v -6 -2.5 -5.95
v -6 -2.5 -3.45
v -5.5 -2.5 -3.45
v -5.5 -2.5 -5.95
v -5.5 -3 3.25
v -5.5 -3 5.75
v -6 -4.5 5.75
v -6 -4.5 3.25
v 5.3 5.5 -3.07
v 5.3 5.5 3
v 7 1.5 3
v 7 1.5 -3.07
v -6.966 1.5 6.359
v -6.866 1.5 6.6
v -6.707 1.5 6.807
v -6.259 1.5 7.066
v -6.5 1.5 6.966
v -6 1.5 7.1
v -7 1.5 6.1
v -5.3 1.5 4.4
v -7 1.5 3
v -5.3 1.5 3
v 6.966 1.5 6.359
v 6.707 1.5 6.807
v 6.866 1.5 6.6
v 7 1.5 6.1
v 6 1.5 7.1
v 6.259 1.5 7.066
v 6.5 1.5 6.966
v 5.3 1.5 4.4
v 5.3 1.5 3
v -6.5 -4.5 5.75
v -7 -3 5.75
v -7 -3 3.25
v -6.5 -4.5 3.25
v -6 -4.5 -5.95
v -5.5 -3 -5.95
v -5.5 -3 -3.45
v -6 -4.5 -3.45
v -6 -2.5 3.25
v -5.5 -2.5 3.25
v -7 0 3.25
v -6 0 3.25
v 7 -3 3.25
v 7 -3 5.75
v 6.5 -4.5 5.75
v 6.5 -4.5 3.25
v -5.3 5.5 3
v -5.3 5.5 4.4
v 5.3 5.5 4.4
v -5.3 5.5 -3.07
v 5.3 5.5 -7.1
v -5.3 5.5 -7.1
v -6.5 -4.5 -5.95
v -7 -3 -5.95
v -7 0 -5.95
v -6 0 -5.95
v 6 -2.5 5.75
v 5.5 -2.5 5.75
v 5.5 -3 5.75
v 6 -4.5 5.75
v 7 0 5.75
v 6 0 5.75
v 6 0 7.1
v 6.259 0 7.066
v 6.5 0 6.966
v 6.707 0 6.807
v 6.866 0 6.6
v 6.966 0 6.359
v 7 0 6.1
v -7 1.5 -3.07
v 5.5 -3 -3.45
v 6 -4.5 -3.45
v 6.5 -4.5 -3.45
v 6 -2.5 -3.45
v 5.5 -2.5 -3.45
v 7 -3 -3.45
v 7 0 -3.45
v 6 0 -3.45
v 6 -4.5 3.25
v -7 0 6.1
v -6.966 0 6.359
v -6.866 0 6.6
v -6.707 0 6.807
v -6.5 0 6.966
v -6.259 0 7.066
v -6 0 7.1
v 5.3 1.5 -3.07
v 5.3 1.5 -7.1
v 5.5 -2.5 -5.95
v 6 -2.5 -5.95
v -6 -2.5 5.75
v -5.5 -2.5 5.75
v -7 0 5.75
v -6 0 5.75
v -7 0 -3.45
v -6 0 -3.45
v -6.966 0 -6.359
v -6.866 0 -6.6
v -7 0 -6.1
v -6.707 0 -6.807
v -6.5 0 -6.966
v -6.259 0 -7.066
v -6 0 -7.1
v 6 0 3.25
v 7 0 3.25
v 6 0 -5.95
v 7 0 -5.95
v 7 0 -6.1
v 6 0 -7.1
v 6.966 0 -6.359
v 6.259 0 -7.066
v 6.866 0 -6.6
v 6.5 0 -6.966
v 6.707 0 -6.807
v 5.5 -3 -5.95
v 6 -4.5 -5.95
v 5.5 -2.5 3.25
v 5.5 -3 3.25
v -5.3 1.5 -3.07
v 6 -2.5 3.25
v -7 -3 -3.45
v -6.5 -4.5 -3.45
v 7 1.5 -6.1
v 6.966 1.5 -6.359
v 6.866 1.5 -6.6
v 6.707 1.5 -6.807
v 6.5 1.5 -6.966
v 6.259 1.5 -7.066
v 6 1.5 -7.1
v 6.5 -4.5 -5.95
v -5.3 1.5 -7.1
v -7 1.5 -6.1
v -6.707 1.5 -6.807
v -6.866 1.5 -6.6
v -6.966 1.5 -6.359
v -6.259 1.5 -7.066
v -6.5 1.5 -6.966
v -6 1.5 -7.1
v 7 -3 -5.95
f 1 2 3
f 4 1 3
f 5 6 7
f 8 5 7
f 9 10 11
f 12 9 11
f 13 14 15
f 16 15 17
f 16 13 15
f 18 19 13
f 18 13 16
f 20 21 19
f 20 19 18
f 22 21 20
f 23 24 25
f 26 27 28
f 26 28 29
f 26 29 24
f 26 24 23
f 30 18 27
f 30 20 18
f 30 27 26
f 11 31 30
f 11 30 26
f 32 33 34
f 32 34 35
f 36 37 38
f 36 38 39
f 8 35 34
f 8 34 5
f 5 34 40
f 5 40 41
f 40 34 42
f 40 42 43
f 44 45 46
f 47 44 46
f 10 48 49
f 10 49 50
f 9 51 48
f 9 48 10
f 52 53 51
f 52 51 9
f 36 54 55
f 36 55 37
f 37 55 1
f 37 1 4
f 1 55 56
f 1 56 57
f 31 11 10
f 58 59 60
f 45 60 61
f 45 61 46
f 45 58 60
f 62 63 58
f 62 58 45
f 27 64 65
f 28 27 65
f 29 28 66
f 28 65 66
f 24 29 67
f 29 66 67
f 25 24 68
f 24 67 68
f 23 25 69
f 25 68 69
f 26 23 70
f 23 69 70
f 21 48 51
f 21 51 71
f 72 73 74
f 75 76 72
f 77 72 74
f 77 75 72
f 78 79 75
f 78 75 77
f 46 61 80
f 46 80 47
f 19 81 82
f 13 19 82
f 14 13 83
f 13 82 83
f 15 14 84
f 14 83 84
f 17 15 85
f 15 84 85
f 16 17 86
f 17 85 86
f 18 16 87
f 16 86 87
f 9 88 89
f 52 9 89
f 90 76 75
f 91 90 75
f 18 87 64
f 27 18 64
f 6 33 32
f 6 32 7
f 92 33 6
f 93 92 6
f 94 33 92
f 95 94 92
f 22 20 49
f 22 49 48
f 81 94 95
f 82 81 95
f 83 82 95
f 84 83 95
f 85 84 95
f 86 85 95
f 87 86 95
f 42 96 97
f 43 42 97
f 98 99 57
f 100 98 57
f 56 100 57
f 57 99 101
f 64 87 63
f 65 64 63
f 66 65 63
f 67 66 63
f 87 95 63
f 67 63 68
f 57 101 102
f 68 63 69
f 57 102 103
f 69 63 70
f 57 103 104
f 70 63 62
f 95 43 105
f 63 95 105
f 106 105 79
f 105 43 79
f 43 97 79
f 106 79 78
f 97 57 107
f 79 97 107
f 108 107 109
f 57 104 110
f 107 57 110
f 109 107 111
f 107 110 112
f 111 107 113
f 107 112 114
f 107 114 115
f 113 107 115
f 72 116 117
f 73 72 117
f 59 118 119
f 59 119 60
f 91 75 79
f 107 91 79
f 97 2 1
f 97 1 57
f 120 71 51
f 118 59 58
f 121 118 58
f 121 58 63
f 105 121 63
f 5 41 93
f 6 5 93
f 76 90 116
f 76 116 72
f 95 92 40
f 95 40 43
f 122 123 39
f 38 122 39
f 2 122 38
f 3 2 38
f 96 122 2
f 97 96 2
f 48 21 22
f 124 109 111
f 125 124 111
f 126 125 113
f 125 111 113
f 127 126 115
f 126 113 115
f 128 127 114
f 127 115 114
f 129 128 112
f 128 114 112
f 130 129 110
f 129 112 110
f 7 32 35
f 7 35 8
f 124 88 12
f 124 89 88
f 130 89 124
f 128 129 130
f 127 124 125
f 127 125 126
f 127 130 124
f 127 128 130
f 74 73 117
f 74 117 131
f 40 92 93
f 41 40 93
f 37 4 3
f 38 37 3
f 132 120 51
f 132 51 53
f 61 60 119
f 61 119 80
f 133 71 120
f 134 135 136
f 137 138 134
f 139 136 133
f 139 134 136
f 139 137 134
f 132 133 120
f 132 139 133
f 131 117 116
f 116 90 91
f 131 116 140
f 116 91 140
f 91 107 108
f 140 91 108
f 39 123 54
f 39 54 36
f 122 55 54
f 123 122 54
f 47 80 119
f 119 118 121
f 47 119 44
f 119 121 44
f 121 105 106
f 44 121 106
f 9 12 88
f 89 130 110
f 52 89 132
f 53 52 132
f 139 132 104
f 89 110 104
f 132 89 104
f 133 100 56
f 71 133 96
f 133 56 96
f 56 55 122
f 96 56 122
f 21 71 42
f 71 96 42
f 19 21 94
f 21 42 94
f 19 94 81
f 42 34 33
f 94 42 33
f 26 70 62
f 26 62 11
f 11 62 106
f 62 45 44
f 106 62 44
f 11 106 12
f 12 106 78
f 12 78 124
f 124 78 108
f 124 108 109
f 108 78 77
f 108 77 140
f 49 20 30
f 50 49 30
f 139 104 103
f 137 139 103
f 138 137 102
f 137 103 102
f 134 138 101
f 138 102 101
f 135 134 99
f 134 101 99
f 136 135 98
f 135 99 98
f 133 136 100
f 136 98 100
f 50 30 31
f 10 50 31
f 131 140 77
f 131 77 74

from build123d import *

# Parameters (mm, degrees)
BOSS_EXTRUDE1_DEPTH = 1.5
SKETCH2_W           = 10.6
SKETCH2_H           = 11.5
BOSS_EXTRUDE2_DEPTH = 4
BOSS_EXTRUDE4_DEPTH = 6.07
SKETCH5_W           = 1.5
SKETCH5_H           = 2.5
BOSS_EXTRUDE5_DEPTH = 4.5
SKETCH6_W           = 0.5
SKETCH6_H           = 2.5
CUT_EXTRUDE1_DEPTH  = 16.632418239


with BuildPart() as part:
    # Sketch1 → Boss-Extrude1 (new body)
    with BuildSketch(Plane(origin=(0, 0, 0), x_dir=(1, 0, 0), z_dir=(0, 1, 0))):
        with BuildLine():
            Line((-6, -7.1), (6, -7.1))
            ThreePointArc((6, -7.1), (6.707106781, -6.807106781), (7, -6.1))
            Line((7, -6.1), (7, 6.1))
            ThreePointArc((7, 6.1), (6.707106781, 6.807106781), (6, 7.1))
            Line((6, 7.1), (-6, 7.1))
            ThreePointArc((-6, 7.1), (-6.707106781, 6.807106781), (-7, 6.1))
            Line((-7, 6.1), (-7, -6.1))
            ThreePointArc((-7, -6.1), (-6.707106781, -6.807106781), (-6, -7.1))
        make_face()
    extrude(amount=BOSS_EXTRUDE1_DEPTH)

    # Sketch2 → Boss-Extrude2 (add)
    with BuildSketch(Plane(origin=(0, 1.5, 0), x_dir=(1, 0, 0), z_dir=(0, 1, 0))):
        with Locations((0, 1.35)):
            Rectangle(SKETCH2_W, SKETCH2_H)
    extrude(amount=BOSS_EXTRUDE2_DEPTH)

    # Sketch4 → Boss-Extrude4 (add)
    with BuildSketch(Plane.XY.offset(3)):
        Polygon((-5.3, 5.5), (-7, 1.5), (-5.3, 1.5), align=None)
        Polygon((5.3, 5.5), (7, 1.5), (5.3, 1.5), align=None)
    extrude(amount=-BOSS_EXTRUDE4_DEPTH)

    # Sketch5 → Boss-Extrude5 (add)
    with BuildSketch(Plane.XZ):
        with Locations((-6.25, 4.5)):
            Rectangle(SKETCH5_W, SKETCH5_H)
        with Locations((-6.25, -4.7)):
            Rectangle(SKETCH5_W, SKETCH5_H)
        with Locations((6.25, -4.7)):
            Rectangle(SKETCH5_W, SKETCH5_H)
        with Locations((6.25, 4.5)):
            Rectangle(SKETCH5_W, SKETCH5_H)
    extrude(amount=BOSS_EXTRUDE5_DEPTH)

    # Sketch6 → Cut-Extrude1 (cut, through all)
    with BuildSketch(Plane.XY.offset(5.75)):
        with Locations((-5.75, -1.25)):
            Rectangle(SKETCH6_W, SKETCH6_H)
        Polygon((-7, -4.5), (-7, -3), (-6.5, -4.5), align=None)
        Polygon((-5.5, -3), (-6, -4.5), (-5.5, -4.5), align=None)
        with Locations((5.75, -1.25)):
            Rectangle(SKETCH6_W, SKETCH6_H)
        Polygon((5.5, -3), (6, -4.5), (5.5, -4.5), align=None)
        Polygon((7, -4.5), (7, -3), (6.5, -4.5), align=None)
    extrude(amount=-CUT_EXTRUDE1_DEPTH, mode=Mode.SUBTRACT)


solid = part.part
